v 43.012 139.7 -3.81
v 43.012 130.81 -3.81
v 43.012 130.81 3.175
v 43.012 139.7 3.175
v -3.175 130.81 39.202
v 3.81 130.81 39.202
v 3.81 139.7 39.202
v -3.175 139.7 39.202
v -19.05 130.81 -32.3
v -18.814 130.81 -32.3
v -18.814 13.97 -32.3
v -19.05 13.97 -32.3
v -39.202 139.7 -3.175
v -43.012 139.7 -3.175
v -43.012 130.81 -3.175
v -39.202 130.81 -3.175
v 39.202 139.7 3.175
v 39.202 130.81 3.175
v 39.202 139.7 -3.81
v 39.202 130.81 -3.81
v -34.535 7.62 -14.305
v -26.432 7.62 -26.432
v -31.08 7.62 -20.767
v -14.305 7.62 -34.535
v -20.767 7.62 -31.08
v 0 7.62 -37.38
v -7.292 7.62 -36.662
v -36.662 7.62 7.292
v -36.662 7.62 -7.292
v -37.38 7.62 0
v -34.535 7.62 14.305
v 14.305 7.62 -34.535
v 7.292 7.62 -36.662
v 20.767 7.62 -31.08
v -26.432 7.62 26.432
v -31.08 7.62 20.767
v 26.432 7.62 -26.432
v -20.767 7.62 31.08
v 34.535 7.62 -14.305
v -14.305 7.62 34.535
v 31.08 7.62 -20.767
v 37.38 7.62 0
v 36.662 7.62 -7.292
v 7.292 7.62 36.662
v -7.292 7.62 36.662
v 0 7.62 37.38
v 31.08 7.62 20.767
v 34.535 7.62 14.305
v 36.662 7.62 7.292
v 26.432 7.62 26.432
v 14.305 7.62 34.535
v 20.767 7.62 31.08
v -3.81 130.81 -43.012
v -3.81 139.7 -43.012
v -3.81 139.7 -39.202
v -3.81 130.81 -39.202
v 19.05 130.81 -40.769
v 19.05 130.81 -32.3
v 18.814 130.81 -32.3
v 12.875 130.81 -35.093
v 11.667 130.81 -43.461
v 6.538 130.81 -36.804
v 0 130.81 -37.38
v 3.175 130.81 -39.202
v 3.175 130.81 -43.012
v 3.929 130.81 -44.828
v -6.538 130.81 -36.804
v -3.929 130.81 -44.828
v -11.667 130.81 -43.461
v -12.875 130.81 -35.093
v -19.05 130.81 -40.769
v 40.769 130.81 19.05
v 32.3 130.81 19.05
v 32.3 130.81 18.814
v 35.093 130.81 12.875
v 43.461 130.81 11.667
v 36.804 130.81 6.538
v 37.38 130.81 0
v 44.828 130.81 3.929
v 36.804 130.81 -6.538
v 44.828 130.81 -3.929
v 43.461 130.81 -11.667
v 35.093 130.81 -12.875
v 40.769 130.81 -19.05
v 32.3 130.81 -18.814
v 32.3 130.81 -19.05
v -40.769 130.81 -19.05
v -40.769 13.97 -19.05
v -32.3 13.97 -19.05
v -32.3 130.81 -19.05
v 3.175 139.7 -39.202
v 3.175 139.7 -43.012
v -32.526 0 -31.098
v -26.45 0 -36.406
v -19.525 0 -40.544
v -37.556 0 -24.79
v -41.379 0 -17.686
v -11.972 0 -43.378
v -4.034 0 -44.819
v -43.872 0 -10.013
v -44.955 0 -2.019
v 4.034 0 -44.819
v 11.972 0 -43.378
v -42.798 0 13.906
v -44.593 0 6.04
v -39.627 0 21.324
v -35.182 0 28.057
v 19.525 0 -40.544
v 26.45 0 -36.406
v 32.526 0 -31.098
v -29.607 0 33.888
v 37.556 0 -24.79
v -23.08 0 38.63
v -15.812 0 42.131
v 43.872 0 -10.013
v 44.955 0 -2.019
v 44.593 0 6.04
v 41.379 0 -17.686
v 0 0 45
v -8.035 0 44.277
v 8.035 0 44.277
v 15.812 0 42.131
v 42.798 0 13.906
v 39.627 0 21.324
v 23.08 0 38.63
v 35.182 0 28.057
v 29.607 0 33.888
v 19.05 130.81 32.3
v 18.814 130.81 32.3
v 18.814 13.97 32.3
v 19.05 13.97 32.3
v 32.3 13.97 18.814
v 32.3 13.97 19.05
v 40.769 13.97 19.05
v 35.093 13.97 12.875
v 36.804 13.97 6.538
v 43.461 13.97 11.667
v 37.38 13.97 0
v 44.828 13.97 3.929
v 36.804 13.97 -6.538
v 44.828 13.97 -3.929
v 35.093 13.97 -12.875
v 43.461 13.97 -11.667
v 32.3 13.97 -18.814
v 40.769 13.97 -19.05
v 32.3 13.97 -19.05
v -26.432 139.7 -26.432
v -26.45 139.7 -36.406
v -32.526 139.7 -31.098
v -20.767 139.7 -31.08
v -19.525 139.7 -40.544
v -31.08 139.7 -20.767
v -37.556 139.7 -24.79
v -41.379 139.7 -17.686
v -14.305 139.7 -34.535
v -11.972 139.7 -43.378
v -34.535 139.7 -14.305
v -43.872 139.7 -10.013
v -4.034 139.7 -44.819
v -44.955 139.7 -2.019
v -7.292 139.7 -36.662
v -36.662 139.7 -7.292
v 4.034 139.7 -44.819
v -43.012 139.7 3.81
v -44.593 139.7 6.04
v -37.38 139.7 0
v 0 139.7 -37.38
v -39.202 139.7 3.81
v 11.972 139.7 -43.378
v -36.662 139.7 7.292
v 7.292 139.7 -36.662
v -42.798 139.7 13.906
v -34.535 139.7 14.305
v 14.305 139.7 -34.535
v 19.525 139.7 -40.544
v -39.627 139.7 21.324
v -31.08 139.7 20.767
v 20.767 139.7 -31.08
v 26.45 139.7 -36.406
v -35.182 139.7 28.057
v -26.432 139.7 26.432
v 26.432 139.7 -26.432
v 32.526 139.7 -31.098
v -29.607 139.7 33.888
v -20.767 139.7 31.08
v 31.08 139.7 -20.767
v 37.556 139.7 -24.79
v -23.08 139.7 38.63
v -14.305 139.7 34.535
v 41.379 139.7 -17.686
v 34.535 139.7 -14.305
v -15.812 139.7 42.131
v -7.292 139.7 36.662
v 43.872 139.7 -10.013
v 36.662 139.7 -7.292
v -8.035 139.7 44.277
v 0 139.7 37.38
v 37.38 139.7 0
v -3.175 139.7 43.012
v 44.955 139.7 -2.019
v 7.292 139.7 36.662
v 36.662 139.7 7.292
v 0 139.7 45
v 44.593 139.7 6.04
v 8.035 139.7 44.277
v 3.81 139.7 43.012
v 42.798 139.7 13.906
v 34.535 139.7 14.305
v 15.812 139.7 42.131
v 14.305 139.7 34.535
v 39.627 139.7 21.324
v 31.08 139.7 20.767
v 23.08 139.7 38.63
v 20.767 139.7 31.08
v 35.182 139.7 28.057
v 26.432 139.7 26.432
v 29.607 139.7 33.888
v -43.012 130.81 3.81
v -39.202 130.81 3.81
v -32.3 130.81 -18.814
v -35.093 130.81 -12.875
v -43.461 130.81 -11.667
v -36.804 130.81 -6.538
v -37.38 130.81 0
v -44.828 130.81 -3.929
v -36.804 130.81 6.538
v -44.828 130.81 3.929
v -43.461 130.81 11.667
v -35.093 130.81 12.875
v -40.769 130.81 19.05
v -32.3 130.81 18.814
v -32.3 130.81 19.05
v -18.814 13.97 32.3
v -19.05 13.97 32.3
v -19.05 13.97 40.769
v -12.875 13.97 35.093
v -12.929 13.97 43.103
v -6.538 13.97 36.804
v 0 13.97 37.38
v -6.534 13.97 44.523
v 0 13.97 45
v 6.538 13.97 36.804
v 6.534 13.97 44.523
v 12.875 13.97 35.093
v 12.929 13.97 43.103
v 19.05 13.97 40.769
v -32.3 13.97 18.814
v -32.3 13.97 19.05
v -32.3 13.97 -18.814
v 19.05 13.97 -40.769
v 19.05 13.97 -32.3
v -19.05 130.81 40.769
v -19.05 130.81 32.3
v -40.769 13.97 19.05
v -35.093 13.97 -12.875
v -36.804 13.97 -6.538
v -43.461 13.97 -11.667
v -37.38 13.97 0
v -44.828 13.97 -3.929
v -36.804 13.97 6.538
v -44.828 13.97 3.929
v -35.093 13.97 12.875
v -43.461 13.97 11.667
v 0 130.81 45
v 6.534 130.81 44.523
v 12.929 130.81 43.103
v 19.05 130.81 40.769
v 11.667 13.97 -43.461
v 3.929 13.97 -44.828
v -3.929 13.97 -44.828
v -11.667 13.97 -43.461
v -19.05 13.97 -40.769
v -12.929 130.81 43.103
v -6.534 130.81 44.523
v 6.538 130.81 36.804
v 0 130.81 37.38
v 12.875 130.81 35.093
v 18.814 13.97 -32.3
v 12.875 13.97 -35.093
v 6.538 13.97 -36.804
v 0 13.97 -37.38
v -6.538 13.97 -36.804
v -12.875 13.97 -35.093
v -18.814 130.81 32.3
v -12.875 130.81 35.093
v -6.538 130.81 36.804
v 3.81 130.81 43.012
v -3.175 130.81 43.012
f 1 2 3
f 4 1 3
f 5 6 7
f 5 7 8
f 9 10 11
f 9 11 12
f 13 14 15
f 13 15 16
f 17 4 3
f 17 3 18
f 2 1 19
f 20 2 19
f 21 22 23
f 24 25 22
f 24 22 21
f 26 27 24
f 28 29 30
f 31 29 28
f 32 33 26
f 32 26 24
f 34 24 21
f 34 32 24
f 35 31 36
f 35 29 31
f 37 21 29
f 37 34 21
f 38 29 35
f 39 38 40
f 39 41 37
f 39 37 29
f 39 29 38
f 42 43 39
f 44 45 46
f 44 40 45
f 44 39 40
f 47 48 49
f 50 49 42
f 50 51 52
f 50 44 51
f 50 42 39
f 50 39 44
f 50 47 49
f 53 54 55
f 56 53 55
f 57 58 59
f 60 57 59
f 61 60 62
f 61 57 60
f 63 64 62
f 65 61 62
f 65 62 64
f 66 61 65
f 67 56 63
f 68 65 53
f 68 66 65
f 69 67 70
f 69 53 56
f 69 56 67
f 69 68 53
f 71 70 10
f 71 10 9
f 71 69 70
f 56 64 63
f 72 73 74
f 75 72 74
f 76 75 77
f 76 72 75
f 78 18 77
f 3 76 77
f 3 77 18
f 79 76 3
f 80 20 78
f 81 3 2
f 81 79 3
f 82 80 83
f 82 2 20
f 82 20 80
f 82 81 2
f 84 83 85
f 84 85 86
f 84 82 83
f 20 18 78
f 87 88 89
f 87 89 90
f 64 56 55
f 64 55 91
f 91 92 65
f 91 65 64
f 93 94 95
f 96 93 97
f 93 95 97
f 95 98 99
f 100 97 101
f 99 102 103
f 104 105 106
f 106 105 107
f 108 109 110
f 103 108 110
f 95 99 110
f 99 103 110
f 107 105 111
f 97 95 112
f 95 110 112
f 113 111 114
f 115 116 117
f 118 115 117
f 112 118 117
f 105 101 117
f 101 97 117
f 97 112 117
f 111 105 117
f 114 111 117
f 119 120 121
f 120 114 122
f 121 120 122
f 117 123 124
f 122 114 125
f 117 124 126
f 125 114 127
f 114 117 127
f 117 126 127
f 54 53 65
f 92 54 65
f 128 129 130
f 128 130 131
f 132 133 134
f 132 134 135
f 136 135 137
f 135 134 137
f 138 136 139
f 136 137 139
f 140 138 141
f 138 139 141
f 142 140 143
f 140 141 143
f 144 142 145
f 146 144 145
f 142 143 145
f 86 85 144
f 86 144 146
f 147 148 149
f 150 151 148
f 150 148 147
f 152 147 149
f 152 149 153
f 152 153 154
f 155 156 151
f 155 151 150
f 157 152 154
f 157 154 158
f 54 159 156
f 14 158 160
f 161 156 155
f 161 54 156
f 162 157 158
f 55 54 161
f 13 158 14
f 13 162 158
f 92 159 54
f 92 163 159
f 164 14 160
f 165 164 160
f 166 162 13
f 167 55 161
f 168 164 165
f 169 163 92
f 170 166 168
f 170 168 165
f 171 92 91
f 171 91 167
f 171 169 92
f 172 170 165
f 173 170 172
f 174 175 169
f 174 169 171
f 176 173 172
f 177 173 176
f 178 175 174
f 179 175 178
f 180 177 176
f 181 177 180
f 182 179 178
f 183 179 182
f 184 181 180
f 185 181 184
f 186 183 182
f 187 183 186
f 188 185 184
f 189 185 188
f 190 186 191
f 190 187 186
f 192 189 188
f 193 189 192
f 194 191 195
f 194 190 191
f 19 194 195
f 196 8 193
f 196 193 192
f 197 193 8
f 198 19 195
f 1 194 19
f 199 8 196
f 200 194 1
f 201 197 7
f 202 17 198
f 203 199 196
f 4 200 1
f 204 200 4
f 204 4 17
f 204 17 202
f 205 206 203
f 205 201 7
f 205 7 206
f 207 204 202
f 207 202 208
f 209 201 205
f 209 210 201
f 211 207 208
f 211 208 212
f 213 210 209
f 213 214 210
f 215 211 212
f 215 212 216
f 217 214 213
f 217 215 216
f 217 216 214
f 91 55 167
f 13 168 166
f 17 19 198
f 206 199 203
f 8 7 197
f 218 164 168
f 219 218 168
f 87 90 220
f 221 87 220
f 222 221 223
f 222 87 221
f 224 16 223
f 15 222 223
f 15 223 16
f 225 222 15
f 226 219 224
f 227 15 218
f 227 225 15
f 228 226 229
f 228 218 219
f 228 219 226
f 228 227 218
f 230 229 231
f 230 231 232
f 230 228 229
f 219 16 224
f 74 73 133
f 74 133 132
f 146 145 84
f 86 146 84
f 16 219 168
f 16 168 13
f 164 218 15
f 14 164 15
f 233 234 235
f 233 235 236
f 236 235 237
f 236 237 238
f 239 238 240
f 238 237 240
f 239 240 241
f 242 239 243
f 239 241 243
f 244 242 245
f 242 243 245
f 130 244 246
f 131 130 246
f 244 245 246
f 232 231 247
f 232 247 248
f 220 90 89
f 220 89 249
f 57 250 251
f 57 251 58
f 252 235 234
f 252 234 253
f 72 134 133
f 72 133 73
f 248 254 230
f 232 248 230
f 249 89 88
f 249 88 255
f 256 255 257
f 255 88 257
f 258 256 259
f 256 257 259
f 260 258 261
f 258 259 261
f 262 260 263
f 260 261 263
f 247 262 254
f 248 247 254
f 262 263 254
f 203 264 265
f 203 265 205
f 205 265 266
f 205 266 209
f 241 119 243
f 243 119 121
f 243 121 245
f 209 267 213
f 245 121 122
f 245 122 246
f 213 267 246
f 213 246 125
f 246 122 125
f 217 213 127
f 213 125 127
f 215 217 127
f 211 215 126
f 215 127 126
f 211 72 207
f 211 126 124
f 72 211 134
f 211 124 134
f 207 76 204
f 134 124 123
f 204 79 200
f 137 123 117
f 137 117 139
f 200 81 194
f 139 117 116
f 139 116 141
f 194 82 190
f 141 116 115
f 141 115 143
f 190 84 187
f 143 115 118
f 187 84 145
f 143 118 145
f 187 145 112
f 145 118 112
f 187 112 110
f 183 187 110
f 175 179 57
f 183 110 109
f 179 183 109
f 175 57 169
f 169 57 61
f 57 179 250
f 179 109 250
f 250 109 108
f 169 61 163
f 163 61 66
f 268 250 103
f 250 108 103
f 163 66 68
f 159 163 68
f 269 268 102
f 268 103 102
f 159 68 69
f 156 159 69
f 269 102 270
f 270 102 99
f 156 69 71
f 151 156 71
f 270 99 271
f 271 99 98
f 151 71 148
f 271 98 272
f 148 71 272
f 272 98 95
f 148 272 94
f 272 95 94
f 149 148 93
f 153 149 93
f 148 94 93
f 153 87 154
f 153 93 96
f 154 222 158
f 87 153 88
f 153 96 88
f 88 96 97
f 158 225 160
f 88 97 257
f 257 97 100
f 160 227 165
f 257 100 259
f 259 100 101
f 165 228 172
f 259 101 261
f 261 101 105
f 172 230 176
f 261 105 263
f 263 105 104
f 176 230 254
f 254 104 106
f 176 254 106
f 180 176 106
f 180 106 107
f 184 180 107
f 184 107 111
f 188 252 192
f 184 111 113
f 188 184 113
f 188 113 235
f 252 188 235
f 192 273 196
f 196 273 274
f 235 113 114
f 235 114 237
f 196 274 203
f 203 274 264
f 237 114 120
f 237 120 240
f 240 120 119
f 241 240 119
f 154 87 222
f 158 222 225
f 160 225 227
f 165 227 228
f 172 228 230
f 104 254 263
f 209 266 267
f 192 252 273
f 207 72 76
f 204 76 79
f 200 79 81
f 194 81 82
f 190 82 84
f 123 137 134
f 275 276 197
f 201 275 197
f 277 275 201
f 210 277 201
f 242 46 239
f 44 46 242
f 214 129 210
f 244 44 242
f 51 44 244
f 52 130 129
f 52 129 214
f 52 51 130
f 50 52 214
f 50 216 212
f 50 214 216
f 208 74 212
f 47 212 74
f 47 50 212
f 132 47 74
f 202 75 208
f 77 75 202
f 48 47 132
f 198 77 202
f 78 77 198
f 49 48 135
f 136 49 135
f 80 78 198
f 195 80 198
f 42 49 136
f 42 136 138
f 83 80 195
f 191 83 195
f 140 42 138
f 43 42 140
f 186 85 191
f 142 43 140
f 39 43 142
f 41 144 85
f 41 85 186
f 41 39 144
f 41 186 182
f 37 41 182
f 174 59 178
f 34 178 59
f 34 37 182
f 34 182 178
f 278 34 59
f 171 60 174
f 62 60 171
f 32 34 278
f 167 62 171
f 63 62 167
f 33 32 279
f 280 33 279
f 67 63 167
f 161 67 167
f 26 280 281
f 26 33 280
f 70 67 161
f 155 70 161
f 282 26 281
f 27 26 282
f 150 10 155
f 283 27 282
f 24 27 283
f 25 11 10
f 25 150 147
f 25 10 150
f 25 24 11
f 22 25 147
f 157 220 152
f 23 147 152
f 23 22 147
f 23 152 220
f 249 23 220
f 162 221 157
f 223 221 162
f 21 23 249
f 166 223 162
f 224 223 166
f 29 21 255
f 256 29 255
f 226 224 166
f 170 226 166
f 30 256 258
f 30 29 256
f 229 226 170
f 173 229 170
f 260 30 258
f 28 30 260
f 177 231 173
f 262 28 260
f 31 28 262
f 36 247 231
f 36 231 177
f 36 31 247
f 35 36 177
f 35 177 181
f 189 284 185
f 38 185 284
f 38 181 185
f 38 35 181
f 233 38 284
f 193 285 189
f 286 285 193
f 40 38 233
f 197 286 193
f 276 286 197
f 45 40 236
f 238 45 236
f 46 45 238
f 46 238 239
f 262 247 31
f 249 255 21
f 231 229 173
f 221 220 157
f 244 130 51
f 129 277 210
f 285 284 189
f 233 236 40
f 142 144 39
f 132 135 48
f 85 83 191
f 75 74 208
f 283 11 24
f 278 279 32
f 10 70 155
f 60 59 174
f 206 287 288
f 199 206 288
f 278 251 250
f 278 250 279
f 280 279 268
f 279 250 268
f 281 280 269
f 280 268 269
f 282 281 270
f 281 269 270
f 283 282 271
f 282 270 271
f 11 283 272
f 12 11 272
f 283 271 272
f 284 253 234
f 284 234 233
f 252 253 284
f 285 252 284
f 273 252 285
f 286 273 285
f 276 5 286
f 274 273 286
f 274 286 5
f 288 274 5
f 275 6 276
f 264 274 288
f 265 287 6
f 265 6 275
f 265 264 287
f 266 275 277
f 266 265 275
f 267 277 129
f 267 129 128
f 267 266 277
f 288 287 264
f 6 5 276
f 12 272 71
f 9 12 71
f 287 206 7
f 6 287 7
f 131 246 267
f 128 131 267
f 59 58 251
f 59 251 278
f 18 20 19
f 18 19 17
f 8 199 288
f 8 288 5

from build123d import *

# Parameters (mm, degrees)
SKETCH1_R           = 45
BOSS_EXTRUDE3_DEPTH = 139.7
SHELL2_T            = -7.62
SKETCH15_W          = 38.1
SKETCH15_H          = 116.84
CUT_EXTRUDE3_DEPTH  = 12.7
CIRPATTERN4_COUNT   = 4
SKETCH14_W          = 3.81
SKETCH14_H          = 6.985
CUT_EXTRUDE2_DEPTH  = 12.7
CIRPATTERN3_COUNT   = 4


with BuildPart() as part:
    # Sketch1 → Boss-Extrude3 (new body)
    with BuildSketch(Plane(origin=(0, 0, 0), x_dir=(1, 0, 0), z_dir=(0, 1, 0))):
        with Locations(Location((0, 0, 0), (0, 0, 270))):
            Circle(SKETCH1_R)
    extrude(amount=BOSS_EXTRUDE3_DEPTH)

    # Shell2
    shell2_openings = [part.faces().sort_by_distance(p)[0] for p in [
        (0, 139.7, 0),
    ]]
    offset(amount=SHELL2_T, openings=shell2_openings, kind=Kind.INTERSECTION)

    # Sketch15 → Cut-Extrude3 (cut)
    with BuildSketch(Plane(origin=(45, 0, 0), x_dir=(0, 0, -1), z_dir=(1, 0, 0))):
        with Locations((0, 72.39)):
            Rectangle(SKETCH15_W, SKETCH15_H)
    cut_extrude3 = extrude(amount=-CUT_EXTRUDE3_DEPTH, mode=Mode.SUBTRACT)

    # CirPattern4: Cut-Extrude3 ×4 about axis
    cirpattern4_axis = Axis((0, 0, 0), (0, 1, 0))
    for i in range(1, CIRPATTERN4_COUNT):
        add(cut_extrude3.rotate(cirpattern4_axis, i * 360 / CIRPATTERN4_COUNT), mode=Mode.SUBTRACT)

    # Sketch14 → Cut-Extrude2 (cut)
    with BuildSketch(Plane(origin=(0, 142.24, 0), x_dir=(1, 0, 0), z_dir=(0, 1, 0))):
        with Locations((-41.106583324, -0.3175)):
            Rectangle(SKETCH14_W, SKETCH14_H)
    cut_extrude2 = extrude(amount=-CUT_EXTRUDE2_DEPTH, mode=Mode.SUBTRACT)

    # CirPattern3: Cut-Extrude2 ×4 about axis
    cirpattern3_axis = Axis((0, 0, 0), (0, 1, 0))
    for i in range(1, CIRPATTERN3_COUNT):
        add(cut_extrude2.rotate(cirpattern3_axis, i * 360 / CIRPATTERN3_COUNT), mode=Mode.SUBTRACT)


solid = part.part
